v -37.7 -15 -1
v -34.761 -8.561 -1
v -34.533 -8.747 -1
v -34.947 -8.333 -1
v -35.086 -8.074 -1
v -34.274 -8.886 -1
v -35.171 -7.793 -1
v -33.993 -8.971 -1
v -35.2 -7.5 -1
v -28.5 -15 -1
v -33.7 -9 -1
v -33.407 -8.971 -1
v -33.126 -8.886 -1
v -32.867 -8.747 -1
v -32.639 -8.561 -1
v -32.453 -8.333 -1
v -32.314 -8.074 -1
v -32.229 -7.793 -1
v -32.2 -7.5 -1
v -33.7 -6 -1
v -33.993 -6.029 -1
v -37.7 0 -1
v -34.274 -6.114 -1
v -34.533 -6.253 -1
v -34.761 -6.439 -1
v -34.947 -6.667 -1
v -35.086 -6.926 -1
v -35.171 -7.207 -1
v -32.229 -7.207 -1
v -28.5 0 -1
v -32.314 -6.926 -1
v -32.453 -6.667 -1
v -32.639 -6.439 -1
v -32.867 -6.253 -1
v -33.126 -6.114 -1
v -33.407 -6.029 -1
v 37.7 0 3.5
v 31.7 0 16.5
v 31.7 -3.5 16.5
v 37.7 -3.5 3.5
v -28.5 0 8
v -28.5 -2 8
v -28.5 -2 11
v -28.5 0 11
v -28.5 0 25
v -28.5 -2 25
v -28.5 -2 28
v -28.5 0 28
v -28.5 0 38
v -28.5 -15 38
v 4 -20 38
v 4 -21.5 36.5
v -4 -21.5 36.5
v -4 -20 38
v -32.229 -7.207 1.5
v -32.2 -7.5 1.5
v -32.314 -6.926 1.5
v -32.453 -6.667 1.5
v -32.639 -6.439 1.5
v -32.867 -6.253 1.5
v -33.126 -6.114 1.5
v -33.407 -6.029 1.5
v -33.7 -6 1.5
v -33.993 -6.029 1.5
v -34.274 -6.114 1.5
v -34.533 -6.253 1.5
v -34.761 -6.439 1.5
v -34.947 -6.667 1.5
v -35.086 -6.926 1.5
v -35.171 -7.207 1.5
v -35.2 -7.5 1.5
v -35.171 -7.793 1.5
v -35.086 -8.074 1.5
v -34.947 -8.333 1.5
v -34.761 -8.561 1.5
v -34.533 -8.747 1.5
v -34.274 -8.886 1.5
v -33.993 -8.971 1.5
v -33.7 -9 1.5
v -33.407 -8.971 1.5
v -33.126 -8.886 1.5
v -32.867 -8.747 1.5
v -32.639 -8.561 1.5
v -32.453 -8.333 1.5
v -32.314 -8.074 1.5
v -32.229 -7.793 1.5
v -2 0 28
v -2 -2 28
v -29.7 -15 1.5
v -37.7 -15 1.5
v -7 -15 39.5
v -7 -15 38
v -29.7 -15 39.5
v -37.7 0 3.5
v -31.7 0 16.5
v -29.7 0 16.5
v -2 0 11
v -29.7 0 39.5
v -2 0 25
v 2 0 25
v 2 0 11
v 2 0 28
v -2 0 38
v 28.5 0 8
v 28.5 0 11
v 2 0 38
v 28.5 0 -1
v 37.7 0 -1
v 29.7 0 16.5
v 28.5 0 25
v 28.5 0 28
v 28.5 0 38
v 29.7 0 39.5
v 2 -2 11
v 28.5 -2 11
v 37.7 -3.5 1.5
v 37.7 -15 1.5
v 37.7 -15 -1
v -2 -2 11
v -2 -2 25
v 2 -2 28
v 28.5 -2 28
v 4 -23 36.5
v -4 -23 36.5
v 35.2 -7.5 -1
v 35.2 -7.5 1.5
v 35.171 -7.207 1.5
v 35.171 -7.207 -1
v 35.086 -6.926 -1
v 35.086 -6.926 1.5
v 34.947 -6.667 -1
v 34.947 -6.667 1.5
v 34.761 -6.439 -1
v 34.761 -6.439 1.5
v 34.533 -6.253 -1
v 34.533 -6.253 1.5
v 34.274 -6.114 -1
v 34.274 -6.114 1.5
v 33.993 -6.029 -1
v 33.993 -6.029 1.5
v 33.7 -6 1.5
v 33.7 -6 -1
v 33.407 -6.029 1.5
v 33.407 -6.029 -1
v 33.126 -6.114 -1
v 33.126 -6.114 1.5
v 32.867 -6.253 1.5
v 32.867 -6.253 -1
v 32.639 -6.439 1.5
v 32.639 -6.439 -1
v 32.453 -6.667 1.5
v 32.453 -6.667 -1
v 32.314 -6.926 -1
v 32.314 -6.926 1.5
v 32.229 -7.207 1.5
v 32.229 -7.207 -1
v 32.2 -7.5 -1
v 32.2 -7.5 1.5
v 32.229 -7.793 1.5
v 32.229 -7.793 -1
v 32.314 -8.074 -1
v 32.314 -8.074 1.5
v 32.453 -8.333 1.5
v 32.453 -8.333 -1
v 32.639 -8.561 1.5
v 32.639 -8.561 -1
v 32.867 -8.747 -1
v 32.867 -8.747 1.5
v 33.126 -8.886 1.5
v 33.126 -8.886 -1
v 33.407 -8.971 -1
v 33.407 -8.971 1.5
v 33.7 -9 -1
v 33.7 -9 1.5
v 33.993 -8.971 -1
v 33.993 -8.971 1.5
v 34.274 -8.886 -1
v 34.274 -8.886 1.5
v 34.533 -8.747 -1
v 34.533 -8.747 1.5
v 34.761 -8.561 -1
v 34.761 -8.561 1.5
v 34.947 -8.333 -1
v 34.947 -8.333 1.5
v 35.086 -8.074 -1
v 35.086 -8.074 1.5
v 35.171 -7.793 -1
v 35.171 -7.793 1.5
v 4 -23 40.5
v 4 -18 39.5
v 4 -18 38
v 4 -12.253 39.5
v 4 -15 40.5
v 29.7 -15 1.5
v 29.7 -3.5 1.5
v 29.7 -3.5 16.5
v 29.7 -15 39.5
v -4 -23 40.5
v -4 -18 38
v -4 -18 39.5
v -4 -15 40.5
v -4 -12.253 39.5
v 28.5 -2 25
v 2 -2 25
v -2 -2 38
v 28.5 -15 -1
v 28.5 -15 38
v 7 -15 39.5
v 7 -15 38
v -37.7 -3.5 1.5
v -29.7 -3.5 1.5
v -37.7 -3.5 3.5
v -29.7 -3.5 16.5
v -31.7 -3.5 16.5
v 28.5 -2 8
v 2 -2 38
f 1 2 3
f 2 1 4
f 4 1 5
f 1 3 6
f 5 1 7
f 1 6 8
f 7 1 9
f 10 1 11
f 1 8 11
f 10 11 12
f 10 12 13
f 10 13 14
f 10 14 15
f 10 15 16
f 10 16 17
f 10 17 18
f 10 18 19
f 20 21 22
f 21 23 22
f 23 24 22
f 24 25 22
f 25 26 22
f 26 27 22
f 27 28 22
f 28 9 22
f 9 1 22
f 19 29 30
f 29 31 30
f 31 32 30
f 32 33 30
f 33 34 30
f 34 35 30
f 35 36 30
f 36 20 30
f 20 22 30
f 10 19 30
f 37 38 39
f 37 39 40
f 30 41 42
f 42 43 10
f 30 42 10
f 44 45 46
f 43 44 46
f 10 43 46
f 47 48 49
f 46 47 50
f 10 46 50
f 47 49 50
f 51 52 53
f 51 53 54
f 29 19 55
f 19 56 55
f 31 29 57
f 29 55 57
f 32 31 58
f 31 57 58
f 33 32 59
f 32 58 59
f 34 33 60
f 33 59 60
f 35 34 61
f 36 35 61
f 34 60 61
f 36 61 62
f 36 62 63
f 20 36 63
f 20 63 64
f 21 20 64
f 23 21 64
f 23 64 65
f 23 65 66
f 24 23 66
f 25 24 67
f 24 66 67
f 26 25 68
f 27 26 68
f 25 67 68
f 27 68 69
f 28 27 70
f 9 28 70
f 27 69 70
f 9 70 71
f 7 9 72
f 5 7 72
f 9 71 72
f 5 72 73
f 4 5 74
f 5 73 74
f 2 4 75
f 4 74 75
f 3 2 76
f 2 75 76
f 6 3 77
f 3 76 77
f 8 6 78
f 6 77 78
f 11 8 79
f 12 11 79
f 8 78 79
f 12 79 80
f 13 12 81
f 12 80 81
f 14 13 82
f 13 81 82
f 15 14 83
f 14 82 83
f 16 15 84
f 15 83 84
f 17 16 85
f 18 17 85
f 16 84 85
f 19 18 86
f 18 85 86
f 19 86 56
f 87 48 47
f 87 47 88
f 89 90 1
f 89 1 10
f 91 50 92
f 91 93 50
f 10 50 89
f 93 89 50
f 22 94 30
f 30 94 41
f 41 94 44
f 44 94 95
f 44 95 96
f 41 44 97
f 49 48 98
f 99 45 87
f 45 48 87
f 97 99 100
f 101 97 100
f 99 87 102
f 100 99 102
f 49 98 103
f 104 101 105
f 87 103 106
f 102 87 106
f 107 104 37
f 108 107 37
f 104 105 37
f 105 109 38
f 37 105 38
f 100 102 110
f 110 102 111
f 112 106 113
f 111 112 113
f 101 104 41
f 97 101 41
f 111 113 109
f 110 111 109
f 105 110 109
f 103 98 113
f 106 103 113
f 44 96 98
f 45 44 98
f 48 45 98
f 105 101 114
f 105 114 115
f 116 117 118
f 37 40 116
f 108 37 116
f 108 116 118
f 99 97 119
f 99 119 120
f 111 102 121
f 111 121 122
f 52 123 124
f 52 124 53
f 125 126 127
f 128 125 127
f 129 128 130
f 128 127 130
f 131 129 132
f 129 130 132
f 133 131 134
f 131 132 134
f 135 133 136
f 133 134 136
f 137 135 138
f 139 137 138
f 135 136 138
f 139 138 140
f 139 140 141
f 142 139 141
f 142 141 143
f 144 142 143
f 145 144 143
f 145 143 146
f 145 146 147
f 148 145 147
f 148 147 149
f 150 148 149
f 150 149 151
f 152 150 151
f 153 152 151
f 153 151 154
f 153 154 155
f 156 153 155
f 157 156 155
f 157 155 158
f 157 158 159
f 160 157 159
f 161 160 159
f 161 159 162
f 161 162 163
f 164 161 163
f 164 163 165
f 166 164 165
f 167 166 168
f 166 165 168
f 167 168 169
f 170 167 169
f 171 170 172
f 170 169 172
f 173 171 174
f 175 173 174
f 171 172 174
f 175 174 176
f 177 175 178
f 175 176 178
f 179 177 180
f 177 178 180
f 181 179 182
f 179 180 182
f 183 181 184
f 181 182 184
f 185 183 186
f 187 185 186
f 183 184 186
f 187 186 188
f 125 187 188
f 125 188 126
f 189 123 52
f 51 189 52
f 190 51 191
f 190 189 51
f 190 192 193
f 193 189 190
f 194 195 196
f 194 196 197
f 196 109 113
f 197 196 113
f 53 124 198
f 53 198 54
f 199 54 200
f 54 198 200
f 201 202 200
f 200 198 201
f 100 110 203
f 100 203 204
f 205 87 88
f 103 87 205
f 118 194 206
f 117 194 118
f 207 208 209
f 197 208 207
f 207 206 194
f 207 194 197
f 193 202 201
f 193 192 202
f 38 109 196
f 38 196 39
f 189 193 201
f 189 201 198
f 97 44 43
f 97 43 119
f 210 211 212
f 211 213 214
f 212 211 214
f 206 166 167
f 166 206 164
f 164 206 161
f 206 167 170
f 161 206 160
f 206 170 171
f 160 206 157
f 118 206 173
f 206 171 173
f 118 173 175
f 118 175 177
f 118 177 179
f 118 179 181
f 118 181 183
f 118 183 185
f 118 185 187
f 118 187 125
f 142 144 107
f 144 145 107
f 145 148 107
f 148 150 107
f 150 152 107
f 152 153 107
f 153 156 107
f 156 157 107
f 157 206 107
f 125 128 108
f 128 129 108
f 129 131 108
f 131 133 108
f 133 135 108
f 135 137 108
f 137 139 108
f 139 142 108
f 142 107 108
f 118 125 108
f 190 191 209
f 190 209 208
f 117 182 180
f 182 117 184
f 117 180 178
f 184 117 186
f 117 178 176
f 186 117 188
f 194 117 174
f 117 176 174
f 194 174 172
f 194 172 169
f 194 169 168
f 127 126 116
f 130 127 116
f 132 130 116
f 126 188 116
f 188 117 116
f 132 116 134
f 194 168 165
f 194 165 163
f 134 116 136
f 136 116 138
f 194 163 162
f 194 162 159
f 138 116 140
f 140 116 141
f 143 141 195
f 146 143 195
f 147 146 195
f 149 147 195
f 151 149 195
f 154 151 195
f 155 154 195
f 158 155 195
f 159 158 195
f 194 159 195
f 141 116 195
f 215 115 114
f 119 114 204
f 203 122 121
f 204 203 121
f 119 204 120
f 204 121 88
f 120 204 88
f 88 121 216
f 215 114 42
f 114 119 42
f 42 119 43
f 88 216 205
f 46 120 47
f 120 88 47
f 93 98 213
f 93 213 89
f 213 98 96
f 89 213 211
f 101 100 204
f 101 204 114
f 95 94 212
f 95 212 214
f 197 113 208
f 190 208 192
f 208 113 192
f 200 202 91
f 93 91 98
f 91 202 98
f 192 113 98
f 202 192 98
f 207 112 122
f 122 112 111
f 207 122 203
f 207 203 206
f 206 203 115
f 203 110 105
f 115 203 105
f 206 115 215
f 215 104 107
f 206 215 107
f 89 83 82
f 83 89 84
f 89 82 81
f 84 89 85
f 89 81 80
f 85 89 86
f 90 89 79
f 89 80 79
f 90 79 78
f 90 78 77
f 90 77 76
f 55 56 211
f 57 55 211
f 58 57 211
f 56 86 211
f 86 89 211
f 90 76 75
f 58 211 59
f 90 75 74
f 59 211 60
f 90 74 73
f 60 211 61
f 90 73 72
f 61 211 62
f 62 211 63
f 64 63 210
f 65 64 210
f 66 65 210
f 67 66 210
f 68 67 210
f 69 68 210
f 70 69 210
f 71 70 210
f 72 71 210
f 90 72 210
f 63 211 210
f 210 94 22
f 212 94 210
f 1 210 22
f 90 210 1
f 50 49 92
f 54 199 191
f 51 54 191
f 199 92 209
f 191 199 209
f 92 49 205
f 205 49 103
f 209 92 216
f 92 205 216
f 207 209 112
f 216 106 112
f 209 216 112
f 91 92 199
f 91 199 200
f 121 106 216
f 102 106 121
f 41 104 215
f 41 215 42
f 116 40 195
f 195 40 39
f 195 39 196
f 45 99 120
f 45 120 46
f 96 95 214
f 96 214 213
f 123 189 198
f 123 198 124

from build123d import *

# Parameters (mm, degrees)
F1_DEPTH  = 15
F3_DEPTH  = 2
F4_R      = 1.5
F5_DEPTH  = 25
F7_DEPTH  = 4
F8_SIZE   = 3
F10_DEPTH = 3.5
F11_DEPTH = 1


with BuildPart() as f1:
    # F0 (on Front) → F1 (new body)
    with BuildSketch(Plane.XZ):
        Polygon((-28.5, 38), (0, 38), (28.5, 38), (28.5, 0), (37.7, 0), (37.7, 1.5), (29.7, 1.5), (29.7, 39.5), (0, 39.5), (-29.7, 39.5), (-29.7, 1.5), (-37.7, 1.5), (-37.7, 0), (-28.5, 0), align=None)
    extrude(amount=F1_DEPTH)

    # F2 (on face) → F3 (join)
    with BuildSketch(Plane(origin=(0, 0, 0), x_dir=(-1, 0, 0), z_dir=(0, 1, 0))):
        Polygon((-28.5, 11), (-28.5, 8), (-2, 8), (2, 8), (28.5, 8), (28.5, 11), (2, 11), (2, 25), (28.5, 25), (28.5, 28), (2, 28), (2, 38), (-2, 38), (-2, 28), (-28.5, 28), (-28.5, 25), (-2, 25), (-2, 11), align=None)
    extrude(amount=-F3_DEPTH)

    # F4 (on face) → F5 (cut)
    with BuildSketch(Plane.XY.offset(1.5)):
        with Locations((-33.7, -7.5)):
            Circle(F4_R)
        with Locations((33.7, -7.5)):
            Circle(F4_R)
    extrude(amount=-F5_DEPTH, mode=Mode.SUBTRACT)

    # F6 (on Right) → F7 (join, symmetric)
    with BuildSketch(Plane.YZ):
        Polygon((-12.2525225805, 39.5), (-15, 40.5), (-23, 40.5), (-23, 38), (-23, 36.5), (-21.5, 36.5), (-20, 38), (-15, 38), (-15, 39.5), align=None)
    extrude(amount=F7_DEPTH, both=True)

    # F8
    f8_edges = [f1.edges().sort_by_distance(p)[0] for p in [
        (4, -15, 38.75),
        (-4, -15, 38.75),
    ]]
    chamfer(f8_edges, length=F8_SIZE)

    # F9 (on face) → F10 (join)
    with BuildSketch(Plane(origin=(0, 0, 0), x_dir=(-1, 0, 0), z_dir=(0, 1, 0))):
        Polygon((-29.7, 1.5), (-29.7, 16.5), (-31.7, 16.5), (-37.7, 3.5), (-37.7, 1.5), align=None)
        Polygon((29.7, 1.5), (37.7, 1.5), (37.7, 3.5), (31.7, 16.5), (29.7, 16.5), align=None)
    extrude(amount=-F10_DEPTH)

    # F11 (add): faces of the model
    f11_faces = [f1.faces().sort_by_distance(p)[0] for p in [
        (-37.5240340942, -7.5, 0),
        (28.6759659058, -7.5, 0),
    ]]
    extrude(f11_faces, amount=F11_DEPTH)


solid = f1.part
